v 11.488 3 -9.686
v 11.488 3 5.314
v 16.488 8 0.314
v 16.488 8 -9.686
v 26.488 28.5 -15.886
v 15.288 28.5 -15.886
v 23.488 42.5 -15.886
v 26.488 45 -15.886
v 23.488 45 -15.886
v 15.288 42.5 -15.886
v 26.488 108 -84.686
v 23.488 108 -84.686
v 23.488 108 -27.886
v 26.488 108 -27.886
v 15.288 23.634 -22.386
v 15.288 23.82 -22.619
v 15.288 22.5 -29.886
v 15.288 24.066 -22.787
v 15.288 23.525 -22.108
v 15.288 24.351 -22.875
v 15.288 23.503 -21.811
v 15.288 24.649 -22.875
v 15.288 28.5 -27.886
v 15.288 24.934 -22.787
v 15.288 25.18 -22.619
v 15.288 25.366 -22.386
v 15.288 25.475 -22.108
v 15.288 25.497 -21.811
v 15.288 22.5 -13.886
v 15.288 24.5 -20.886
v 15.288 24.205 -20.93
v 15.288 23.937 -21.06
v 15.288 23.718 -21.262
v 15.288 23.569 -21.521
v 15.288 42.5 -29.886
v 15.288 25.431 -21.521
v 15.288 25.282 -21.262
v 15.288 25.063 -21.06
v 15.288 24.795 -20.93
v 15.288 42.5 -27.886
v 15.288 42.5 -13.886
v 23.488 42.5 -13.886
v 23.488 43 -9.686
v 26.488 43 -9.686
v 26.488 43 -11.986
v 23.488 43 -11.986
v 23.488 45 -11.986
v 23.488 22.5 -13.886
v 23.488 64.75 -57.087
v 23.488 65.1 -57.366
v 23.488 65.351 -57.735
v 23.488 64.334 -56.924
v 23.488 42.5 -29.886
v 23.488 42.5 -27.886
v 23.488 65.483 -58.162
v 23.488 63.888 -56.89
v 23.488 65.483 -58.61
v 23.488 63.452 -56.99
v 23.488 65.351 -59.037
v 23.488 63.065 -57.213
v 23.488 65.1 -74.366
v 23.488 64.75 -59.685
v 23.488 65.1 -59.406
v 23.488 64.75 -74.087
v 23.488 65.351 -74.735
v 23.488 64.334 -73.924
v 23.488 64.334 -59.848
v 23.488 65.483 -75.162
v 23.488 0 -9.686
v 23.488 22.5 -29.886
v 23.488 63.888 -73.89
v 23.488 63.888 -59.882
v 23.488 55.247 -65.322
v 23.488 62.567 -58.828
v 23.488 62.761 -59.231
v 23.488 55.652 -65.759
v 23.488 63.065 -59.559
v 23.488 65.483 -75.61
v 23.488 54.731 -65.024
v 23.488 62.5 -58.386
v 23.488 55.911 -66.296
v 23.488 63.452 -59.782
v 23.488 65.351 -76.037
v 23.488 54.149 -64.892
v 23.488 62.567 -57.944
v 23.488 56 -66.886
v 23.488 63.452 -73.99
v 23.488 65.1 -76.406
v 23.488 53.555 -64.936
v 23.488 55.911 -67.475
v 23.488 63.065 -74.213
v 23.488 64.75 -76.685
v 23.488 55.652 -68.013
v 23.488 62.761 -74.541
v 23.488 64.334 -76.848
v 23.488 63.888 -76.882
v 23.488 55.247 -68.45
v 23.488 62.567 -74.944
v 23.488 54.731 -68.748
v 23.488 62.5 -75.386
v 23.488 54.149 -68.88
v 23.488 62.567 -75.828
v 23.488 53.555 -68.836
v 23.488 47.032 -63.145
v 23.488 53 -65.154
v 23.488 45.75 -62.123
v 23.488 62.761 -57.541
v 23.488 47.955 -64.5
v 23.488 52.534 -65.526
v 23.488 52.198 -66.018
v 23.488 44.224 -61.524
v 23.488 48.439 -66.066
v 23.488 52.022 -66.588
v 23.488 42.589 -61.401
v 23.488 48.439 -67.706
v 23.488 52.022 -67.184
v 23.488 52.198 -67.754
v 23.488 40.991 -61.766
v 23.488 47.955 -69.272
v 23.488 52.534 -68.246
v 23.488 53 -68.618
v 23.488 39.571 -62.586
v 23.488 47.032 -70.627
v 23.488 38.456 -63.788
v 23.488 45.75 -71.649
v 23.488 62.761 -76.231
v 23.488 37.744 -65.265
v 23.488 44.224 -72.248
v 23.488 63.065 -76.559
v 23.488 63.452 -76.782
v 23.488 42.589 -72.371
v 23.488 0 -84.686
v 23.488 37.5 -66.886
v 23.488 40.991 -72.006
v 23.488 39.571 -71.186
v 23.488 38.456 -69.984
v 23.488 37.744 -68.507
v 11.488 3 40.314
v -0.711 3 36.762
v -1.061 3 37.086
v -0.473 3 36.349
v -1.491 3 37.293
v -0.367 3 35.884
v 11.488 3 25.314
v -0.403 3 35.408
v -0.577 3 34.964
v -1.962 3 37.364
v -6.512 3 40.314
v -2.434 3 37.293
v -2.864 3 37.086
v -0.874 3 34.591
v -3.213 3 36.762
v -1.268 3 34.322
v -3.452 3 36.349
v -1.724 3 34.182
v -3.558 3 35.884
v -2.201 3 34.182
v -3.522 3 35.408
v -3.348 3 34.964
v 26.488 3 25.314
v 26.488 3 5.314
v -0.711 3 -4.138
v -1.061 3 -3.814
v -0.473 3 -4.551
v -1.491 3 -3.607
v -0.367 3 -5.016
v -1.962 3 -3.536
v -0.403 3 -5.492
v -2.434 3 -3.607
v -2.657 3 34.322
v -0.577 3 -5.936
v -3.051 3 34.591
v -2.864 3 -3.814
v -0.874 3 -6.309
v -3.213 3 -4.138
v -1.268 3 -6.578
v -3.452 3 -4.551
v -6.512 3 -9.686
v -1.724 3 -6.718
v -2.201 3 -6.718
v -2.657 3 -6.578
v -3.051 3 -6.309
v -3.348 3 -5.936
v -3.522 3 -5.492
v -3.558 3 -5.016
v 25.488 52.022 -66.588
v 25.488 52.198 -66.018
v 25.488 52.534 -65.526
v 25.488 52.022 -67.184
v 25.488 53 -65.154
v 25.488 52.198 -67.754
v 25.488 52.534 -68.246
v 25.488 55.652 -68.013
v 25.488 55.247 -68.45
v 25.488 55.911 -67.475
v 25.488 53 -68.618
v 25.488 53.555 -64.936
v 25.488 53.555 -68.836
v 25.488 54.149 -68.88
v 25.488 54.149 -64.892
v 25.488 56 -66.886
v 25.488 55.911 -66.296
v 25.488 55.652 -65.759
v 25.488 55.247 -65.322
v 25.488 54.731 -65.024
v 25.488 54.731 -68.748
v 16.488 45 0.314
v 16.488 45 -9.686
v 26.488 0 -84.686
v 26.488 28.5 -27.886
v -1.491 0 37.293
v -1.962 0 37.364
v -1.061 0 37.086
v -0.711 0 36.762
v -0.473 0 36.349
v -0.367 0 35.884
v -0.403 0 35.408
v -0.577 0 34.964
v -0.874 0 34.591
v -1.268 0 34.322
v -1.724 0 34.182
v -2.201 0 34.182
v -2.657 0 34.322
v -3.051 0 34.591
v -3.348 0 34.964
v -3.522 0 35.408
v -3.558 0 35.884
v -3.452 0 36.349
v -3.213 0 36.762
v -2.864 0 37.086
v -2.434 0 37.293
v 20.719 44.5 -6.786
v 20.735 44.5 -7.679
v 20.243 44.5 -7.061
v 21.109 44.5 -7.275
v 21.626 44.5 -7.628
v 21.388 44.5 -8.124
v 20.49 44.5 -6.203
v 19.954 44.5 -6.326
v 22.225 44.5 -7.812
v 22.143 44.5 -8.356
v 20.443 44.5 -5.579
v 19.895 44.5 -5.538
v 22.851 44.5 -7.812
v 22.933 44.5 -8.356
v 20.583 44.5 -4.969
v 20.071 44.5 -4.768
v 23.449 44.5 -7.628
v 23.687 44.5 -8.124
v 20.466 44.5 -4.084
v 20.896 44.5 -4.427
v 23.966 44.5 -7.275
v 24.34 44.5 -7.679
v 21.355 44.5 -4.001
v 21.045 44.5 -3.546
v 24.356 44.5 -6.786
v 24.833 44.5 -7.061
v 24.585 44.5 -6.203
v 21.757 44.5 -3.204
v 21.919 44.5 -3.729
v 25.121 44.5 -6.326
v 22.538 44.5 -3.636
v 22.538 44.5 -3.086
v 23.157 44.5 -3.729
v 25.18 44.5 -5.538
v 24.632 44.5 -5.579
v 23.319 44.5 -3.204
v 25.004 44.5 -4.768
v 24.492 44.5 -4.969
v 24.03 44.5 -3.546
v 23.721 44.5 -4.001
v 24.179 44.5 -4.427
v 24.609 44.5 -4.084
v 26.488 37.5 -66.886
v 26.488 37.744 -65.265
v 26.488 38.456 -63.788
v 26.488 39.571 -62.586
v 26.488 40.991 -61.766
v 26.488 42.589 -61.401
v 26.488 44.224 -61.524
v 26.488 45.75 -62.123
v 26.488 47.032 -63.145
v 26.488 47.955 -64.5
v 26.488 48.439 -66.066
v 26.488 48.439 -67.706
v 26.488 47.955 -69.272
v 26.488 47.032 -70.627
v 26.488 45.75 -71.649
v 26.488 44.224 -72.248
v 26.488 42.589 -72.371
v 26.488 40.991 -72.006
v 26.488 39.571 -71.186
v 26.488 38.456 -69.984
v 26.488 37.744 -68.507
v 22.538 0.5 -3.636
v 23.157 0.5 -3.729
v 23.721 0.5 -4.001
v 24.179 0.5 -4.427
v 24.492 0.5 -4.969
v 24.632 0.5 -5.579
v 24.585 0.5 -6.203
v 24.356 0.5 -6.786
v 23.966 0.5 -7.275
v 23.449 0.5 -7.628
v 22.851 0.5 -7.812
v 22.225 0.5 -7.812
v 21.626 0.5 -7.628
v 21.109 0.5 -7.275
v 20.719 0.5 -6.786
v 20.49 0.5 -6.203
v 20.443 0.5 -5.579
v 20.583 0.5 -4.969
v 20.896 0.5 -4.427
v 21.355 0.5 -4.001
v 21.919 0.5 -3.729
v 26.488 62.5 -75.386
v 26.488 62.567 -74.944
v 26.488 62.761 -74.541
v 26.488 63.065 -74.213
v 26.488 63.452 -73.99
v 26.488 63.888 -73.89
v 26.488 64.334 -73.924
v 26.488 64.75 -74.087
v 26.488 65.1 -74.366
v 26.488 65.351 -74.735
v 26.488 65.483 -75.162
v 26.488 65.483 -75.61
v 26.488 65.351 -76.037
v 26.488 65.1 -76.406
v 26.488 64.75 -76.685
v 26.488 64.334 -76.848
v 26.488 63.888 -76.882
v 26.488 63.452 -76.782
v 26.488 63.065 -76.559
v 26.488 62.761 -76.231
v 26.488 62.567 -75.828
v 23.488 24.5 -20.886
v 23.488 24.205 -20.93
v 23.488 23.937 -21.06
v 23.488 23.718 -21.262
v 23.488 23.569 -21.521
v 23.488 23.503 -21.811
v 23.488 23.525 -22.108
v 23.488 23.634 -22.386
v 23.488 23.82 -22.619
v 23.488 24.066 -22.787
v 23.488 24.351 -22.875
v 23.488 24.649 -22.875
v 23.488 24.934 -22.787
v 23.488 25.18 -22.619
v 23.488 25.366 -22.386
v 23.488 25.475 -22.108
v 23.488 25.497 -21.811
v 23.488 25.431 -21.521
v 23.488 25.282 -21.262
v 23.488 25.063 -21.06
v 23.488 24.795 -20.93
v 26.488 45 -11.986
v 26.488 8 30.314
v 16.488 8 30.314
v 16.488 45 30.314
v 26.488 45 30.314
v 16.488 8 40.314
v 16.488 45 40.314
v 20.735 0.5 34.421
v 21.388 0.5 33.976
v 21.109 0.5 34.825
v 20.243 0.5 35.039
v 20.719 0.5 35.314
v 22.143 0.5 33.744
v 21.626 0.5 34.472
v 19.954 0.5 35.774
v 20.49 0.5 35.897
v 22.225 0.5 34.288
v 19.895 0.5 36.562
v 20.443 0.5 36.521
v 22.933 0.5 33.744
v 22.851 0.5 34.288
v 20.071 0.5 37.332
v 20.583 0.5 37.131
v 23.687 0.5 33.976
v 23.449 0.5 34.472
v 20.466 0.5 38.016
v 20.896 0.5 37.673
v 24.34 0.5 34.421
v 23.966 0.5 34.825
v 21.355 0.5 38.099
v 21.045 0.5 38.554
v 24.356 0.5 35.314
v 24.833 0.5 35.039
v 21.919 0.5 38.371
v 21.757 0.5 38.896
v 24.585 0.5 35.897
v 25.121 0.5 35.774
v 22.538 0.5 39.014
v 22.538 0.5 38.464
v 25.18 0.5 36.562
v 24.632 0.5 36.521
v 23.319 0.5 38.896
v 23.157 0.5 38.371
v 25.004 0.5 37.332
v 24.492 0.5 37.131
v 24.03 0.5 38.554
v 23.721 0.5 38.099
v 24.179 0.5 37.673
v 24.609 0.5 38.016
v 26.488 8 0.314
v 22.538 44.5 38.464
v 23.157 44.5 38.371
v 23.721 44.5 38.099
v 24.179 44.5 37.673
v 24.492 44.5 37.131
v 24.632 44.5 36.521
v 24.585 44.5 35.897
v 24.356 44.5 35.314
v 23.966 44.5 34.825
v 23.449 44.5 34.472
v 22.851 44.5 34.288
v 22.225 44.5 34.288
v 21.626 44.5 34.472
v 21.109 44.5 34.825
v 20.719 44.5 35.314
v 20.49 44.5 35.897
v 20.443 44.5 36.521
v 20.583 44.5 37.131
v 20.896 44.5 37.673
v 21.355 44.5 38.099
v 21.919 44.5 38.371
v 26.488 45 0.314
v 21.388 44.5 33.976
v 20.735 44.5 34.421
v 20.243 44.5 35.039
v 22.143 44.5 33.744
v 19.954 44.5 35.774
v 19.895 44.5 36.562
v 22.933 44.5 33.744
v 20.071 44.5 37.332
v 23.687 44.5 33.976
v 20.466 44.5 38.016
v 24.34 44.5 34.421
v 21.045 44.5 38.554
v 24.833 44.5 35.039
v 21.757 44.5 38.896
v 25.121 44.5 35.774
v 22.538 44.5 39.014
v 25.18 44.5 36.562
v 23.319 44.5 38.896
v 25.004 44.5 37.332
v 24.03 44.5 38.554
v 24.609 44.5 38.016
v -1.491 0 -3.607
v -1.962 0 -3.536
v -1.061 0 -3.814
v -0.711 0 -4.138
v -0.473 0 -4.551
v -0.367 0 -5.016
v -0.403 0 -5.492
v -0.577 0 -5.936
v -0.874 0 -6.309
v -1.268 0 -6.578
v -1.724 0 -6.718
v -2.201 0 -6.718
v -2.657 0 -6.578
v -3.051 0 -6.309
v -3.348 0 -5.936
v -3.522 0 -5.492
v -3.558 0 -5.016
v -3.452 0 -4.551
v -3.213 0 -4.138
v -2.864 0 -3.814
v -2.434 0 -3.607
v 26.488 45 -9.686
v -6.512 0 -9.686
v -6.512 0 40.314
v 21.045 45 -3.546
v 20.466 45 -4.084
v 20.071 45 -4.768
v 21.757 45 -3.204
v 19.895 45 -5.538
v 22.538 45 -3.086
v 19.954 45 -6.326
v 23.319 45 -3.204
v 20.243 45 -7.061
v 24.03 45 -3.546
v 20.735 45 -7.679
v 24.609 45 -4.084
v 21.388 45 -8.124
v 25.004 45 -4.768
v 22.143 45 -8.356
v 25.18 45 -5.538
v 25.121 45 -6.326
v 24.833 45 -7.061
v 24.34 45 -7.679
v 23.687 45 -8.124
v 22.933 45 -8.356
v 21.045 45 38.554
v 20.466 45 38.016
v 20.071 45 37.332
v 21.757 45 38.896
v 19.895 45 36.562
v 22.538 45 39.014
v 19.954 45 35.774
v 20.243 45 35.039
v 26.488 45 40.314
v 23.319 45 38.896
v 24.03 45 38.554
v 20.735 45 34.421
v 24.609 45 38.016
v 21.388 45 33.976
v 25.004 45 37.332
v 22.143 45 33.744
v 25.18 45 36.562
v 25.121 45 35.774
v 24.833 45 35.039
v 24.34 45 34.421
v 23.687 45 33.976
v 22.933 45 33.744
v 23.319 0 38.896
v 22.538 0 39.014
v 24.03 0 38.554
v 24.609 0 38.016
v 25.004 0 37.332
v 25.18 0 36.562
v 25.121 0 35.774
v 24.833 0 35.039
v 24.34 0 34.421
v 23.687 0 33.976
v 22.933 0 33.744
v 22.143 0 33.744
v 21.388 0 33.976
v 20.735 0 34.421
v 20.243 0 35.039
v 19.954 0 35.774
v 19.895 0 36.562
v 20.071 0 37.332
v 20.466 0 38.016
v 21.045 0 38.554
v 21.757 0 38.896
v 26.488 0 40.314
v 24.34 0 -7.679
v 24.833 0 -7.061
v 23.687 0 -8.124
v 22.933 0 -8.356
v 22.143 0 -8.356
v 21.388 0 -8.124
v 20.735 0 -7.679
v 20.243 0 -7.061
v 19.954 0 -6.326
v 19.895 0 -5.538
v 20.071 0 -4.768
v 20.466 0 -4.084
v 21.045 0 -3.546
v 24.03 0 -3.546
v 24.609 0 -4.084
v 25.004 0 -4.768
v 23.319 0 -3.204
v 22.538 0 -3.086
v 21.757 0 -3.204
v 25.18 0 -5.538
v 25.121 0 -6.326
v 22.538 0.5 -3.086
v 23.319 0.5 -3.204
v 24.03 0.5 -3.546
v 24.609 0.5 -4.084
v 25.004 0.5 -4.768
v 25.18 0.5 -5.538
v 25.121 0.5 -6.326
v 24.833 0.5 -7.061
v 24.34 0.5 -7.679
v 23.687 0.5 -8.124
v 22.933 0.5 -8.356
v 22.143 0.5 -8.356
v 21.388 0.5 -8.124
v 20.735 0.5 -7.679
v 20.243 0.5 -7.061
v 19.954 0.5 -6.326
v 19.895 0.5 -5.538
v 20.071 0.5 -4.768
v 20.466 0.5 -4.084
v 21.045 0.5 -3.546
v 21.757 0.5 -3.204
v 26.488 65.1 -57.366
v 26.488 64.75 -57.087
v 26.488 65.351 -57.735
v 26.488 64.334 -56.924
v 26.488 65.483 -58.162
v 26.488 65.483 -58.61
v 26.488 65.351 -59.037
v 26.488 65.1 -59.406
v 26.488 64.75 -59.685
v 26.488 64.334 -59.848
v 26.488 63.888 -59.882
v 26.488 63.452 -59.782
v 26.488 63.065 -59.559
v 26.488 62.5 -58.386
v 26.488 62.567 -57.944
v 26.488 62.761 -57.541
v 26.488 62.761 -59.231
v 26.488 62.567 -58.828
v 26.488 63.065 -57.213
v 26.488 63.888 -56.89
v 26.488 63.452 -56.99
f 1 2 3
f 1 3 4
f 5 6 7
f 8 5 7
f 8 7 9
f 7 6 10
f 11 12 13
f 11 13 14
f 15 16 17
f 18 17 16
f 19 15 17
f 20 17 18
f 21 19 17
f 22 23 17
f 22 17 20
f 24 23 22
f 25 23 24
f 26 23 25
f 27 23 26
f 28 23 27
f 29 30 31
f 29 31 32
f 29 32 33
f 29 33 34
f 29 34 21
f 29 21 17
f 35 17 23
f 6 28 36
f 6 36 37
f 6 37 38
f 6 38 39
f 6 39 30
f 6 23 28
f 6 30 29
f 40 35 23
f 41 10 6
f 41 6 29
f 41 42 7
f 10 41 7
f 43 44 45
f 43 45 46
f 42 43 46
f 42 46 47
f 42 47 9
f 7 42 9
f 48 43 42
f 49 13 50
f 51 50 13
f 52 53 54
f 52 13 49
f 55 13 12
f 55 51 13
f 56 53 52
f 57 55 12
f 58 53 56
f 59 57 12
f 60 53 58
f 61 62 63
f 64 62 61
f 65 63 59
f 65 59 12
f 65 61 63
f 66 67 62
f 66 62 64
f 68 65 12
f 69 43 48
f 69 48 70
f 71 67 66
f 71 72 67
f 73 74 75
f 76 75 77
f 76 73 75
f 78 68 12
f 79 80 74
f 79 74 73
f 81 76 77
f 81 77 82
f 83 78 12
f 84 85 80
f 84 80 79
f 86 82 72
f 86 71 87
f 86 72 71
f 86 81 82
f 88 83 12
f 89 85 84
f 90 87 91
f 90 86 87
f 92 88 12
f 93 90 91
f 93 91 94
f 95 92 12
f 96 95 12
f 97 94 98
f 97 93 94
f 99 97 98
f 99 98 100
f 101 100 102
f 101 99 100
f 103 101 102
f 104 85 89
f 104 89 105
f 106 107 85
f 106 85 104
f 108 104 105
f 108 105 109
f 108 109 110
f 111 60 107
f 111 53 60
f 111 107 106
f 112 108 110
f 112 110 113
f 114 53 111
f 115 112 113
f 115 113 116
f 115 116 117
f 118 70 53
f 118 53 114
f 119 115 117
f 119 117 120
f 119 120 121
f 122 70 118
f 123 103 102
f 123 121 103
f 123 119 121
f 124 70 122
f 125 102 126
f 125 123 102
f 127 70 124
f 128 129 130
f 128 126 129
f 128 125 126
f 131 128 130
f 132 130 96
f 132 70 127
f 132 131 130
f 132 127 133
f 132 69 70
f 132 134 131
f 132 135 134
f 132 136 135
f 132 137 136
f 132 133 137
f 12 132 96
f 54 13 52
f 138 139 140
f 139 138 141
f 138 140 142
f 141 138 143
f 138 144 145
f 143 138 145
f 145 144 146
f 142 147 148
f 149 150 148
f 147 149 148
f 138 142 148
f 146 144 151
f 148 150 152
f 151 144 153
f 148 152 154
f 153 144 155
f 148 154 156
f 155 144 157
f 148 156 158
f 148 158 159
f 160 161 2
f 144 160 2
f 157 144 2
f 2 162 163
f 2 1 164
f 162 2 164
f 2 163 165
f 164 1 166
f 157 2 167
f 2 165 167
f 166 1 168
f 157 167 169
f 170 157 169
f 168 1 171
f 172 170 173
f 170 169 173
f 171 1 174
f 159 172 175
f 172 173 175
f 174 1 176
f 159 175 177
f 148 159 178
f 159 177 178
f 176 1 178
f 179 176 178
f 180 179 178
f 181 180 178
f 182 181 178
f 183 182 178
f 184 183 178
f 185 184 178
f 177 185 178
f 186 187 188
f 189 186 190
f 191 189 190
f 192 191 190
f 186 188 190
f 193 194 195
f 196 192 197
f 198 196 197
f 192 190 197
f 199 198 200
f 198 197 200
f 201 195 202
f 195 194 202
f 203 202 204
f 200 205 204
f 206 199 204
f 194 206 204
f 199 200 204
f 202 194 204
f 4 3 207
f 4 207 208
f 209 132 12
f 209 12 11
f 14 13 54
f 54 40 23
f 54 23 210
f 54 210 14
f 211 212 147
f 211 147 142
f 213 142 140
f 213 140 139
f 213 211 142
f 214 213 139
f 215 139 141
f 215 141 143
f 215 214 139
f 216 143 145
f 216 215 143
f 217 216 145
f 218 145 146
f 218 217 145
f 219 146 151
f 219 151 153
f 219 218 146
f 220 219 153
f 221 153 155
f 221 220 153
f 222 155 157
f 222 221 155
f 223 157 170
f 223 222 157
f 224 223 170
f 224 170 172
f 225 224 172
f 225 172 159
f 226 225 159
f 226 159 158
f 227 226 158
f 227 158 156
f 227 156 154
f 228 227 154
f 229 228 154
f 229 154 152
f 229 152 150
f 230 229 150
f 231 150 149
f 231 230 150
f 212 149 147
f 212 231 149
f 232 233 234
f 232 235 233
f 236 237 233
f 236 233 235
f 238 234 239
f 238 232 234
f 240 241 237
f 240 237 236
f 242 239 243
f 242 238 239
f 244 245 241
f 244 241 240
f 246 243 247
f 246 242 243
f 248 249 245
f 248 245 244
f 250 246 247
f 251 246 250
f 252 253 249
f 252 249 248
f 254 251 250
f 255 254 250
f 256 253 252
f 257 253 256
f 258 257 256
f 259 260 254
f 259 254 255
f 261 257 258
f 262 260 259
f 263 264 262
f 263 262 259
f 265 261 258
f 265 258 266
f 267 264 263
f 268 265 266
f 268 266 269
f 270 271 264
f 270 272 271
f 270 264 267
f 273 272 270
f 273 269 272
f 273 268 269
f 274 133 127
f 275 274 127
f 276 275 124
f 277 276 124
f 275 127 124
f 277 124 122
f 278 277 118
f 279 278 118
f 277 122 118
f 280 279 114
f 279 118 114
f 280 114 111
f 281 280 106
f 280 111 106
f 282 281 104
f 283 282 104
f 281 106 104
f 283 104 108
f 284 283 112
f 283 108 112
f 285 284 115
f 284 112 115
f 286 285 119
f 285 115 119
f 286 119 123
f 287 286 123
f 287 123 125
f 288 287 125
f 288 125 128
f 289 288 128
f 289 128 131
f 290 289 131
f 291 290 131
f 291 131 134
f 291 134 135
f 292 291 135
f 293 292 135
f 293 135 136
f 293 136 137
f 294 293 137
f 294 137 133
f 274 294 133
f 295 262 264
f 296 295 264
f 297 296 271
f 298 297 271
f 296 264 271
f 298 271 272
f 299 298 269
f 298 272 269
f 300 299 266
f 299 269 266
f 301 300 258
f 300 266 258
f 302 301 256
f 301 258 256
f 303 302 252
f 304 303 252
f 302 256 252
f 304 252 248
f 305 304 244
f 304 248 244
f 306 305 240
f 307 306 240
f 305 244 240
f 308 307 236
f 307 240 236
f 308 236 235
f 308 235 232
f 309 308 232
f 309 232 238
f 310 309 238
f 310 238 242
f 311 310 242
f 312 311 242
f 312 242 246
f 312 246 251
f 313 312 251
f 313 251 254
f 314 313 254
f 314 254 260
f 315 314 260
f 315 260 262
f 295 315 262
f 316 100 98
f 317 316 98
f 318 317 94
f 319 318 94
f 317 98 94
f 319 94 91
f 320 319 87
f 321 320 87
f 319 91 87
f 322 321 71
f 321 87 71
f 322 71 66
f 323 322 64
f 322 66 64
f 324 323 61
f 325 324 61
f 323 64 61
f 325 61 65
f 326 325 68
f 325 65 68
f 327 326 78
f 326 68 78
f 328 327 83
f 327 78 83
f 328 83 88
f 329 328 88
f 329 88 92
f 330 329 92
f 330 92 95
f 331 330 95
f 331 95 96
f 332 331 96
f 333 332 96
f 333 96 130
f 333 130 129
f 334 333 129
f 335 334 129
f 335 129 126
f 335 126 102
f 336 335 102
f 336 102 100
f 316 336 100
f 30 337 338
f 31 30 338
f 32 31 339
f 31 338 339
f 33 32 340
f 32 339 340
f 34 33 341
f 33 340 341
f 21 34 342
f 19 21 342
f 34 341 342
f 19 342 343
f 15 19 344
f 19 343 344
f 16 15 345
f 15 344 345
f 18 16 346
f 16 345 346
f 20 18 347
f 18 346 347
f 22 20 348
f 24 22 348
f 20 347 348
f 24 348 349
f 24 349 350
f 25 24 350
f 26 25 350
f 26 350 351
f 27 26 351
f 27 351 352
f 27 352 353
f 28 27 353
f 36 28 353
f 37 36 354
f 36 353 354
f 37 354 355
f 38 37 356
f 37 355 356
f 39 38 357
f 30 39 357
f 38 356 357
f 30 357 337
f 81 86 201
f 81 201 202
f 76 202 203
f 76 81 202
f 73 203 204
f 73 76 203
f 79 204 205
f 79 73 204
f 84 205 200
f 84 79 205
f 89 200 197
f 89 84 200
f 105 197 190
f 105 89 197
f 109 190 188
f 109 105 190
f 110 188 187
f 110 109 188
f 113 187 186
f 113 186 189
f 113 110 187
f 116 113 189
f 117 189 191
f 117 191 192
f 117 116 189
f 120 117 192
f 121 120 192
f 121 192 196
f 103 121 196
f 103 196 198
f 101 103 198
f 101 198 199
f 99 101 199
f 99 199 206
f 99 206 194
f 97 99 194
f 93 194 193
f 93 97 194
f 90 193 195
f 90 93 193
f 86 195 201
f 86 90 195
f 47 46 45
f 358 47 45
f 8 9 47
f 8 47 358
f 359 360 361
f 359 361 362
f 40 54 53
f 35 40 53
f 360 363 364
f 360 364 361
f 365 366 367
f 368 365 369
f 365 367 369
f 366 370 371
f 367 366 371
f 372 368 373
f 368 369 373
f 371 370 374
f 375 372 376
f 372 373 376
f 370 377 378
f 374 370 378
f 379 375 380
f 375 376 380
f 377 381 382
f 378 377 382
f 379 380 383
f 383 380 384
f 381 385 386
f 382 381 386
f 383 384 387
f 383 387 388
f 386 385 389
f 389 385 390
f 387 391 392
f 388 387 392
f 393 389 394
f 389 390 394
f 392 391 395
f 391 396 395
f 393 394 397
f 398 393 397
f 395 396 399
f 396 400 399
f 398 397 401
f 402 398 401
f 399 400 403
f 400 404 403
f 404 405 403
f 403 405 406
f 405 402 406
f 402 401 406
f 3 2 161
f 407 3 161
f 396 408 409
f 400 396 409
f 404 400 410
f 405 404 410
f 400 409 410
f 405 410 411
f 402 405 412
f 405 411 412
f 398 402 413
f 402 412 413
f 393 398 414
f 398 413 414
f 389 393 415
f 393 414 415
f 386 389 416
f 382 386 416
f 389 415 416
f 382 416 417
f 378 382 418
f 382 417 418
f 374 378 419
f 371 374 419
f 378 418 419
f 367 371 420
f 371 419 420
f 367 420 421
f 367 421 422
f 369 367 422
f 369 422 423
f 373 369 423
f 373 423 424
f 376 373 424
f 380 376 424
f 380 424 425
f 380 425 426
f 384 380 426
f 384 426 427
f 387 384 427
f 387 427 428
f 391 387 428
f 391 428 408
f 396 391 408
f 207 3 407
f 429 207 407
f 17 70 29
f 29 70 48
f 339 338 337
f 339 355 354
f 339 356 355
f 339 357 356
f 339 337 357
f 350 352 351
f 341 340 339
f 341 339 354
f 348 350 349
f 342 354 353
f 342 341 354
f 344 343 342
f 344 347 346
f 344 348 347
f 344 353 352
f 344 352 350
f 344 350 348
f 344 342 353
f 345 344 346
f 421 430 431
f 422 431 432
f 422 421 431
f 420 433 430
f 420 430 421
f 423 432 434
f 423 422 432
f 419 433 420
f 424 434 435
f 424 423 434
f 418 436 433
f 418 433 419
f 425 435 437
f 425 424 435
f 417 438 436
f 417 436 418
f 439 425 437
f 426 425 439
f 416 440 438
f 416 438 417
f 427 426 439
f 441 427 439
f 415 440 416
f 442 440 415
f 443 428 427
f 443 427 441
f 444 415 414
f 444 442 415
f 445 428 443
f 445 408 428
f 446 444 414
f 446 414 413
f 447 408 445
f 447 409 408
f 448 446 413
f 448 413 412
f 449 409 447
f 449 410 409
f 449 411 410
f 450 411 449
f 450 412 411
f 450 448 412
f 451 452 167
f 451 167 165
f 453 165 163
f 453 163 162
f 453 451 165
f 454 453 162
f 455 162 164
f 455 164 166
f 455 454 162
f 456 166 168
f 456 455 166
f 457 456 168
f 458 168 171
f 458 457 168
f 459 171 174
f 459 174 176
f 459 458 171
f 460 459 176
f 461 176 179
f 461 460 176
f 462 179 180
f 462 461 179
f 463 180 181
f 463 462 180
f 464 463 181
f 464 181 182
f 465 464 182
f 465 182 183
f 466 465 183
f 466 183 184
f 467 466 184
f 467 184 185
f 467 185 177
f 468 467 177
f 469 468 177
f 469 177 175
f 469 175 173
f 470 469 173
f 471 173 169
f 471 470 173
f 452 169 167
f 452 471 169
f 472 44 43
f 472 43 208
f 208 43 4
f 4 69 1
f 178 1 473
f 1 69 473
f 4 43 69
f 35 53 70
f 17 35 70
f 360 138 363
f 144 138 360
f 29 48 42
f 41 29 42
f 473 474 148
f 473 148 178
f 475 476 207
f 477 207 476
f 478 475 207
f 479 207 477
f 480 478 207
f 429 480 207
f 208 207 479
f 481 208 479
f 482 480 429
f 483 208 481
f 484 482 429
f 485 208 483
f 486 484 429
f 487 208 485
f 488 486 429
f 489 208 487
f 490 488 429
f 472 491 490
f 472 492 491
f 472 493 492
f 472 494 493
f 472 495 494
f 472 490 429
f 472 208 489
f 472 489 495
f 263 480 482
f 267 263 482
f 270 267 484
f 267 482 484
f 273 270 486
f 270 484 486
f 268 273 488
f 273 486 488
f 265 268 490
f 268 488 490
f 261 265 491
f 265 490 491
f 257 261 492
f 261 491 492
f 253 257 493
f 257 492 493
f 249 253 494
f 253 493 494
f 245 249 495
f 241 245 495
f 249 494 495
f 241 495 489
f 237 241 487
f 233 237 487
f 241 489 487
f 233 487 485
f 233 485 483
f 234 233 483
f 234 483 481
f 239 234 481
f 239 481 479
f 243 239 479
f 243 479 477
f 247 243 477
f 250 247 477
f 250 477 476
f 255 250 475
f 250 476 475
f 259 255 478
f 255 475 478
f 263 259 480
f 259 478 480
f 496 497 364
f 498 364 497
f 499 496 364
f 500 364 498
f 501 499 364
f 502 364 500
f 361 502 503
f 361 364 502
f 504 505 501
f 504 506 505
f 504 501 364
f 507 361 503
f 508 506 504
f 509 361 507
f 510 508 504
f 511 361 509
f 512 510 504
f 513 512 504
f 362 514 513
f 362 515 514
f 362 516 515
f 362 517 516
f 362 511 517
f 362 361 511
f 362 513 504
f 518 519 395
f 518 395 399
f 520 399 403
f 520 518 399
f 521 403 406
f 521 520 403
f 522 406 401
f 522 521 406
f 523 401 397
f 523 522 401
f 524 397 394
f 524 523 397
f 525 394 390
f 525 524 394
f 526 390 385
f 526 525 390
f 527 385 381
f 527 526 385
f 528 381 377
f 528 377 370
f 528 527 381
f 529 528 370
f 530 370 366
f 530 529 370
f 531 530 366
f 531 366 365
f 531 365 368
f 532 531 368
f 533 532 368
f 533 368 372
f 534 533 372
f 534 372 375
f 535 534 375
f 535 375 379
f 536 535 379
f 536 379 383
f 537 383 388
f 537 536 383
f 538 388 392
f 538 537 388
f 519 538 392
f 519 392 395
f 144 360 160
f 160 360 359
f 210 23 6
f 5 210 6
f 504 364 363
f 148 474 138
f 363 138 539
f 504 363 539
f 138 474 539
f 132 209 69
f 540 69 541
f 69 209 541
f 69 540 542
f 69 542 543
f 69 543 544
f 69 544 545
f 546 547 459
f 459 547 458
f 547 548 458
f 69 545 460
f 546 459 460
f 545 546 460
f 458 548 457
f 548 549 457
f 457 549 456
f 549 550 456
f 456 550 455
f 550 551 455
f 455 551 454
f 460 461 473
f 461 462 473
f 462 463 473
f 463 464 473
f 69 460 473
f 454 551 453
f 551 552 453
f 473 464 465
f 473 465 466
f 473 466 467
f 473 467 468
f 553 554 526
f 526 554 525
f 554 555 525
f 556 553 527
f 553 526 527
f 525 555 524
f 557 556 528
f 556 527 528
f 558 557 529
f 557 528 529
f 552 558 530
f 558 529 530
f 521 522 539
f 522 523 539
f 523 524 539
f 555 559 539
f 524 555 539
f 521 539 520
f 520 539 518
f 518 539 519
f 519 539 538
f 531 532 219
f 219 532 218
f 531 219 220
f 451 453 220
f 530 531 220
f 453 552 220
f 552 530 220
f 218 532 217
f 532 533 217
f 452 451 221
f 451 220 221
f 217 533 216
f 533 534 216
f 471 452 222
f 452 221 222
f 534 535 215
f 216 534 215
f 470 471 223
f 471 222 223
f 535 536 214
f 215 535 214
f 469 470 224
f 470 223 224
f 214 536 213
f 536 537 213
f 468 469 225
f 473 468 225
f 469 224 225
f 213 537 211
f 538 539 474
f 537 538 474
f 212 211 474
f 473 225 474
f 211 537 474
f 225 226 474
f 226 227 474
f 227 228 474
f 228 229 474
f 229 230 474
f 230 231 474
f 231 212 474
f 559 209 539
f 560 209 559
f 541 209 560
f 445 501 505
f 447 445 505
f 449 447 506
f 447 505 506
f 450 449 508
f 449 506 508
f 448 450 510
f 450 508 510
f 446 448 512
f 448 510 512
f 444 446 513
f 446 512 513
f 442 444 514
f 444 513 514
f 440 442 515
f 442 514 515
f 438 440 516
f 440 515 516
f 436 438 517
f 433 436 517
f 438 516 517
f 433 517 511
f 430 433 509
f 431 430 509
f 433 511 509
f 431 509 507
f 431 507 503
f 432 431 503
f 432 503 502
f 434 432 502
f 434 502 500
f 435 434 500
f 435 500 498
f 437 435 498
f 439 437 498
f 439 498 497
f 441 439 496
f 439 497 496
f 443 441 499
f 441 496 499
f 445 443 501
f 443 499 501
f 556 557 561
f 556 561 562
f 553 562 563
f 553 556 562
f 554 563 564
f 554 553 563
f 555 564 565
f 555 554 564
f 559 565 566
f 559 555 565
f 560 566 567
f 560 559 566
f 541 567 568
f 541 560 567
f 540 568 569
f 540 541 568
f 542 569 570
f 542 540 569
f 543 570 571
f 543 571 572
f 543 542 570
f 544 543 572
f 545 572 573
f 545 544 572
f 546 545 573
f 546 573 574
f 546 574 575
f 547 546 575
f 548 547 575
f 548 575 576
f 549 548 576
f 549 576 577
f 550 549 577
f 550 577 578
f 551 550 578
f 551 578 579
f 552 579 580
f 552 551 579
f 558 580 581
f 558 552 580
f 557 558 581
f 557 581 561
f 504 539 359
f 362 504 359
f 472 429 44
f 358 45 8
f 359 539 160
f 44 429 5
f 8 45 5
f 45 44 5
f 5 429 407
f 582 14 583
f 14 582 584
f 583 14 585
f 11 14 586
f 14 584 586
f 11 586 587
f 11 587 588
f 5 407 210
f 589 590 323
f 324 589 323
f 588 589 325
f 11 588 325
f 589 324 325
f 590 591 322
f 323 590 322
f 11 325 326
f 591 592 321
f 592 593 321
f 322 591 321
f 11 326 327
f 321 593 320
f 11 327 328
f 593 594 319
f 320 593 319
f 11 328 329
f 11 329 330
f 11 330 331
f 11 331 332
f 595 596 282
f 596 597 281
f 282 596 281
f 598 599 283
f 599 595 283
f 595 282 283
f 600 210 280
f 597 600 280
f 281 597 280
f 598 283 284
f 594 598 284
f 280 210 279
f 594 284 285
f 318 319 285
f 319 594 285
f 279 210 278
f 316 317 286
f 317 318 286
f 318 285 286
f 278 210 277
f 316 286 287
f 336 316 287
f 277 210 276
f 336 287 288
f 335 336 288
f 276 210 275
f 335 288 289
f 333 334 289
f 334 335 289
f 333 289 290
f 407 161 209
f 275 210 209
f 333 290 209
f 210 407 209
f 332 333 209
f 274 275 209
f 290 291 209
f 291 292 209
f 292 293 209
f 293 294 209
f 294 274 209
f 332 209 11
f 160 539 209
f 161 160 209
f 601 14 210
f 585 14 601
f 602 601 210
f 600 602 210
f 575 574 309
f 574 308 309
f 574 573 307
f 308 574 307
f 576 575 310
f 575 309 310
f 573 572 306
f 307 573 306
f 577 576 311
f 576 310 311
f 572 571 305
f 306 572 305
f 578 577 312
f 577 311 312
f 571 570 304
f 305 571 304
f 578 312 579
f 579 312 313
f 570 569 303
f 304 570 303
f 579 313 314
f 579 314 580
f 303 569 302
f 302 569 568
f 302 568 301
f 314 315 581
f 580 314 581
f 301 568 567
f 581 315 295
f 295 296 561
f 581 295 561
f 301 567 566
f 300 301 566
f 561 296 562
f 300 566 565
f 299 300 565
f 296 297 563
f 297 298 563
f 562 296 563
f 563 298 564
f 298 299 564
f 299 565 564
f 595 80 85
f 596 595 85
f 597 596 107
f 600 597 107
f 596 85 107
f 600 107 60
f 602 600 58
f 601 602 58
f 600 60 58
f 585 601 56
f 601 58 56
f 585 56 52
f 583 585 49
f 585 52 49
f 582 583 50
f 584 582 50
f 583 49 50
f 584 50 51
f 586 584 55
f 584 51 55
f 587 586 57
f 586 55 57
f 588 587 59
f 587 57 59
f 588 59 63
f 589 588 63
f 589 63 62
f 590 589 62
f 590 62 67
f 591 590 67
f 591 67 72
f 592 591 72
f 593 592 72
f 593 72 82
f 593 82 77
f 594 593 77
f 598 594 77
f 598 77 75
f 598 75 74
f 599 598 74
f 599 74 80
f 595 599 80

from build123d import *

# Parameters (mm, degrees)
SKETCH1_R           = 1.6
BOSS_EXTRUDE1_DEPTH = 3
SKETCH2_W           = 10
SKETCH2_H           = 10
BOSS_EXTRUDE2_DEPTH = 42
CHAMFER1_SIZE       = 5
SKETCH3_R           = 2.1
CUT_EXTRUDE1_DEPTH  = 52
SKETCH4_R           = 2.65
CUT_EXTRUDE2_DEPTH  = 0.5
SKETCH5_W           = 3
SKETCH5_H           = 43
BOSS_EXTRUDE3_DEPTH = 75
SKETCH6_W           = 3
SKETCH6_H           = 72.7
BOSS_EXTRUDE4_DEPTH = 2
SKETCH7_W           = 3
SKETCH7_H           = 68.8
BOSS_EXTRUDE5_DEPTH = 3
BOSS_EXTRUDE7_DEPTH = 8.2
SKETCH9_W           = 12
SKETCH9_H           = 19.5
CUT_EXTRUDE3_DEPTH  = 8.5
SKETCH10_W          = 3
SKETCH10_H          = 56.8
BOSS_EXTRUDE8_DEPTH = 15
SKETCH13_W          = 3
SKETCH13_H          = 56.8
BOSS_EXTRUDE9_DEPTH = 45
SKETCH14_R          = 1.5
SKETCH14_R_2        = 5.5
CUT_EXTRUDE4_DEPTH  = 10
CAVITY2_START       = 23.487603306
CAVITY2_OUTLINE_R   = 2
CAVITY2_DEPTH       = 2


# Read off the part's stored shape, not the designer's step: Cavity2
with BuildPart() as part:
    # Sketch1 → Boss-Extrude1 (new body)
    with BuildSketch(Plane(origin=(0, 0, 0), x_dir=(1, 0, 0), z_dir=(0, 1, 0))):
        Polygon((-6.512396694, 9.685950413), (1.487603306, 9.685950413), (26.487603306, 9.685950413), (26.487603306, -40.314049587), (1.487603306, -40.314049587), (-6.512396694, -40.314049587), align=None)
        with Locations(Location((-1.962396694, -35.764049587, 0), (0, 0, 270))):
            Circle(SKETCH1_R, mode=Mode.SUBTRACT)
        with Locations(Location((-1.962396694, 5.135950413, 0), (0, 0, 270))):
            Circle(SKETCH1_R, mode=Mode.SUBTRACT)
    extrude(amount=BOSS_EXTRUDE1_DEPTH)

    # Sketch2 → Boss-Extrude2 (add)
    with BuildSketch(Plane(origin=(0, 3, 0), x_dir=(1, 0, 0), z_dir=(0, 1, 0))):
        with Locations((21.487603306, -35.314049587)):
            Rectangle(SKETCH2_W, SKETCH2_H)
        with Locations((21.487603306, 4.685950413)):
            Rectangle(SKETCH2_W, SKETCH2_H)
    extrude(amount=BOSS_EXTRUDE2_DEPTH)

    # Chamfer1
    chamfer1_edges = [part.edges().sort_by_distance(p)[0] for p in [
        (21.487603306, 3, 30.314049587),
        (16.487603306, 3, 35.314049587),
        (16.487603306, 3, -4.685950413),
        (21.487603306, 3, 0.314049587),
    ]]
    chamfer(chamfer1_edges, length=CHAMFER1_SIZE)

    # Sketch3 → Cut-Extrude1 (cut)
    with BuildSketch(Plane(origin=(0, 45, 0), x_dir=(1, 0, 0), z_dir=(0, 1, 0))):
        with Locations(Location((22.537603306, -36.364049587, 0), (0, 0, 270))):
            Circle(SKETCH3_R)
        with Locations(Location((22.537603306, 5.735950413, 0), (0, 0, 270))):
            Circle(SKETCH3_R)
    extrude(amount=-CUT_EXTRUDE1_DEPTH, mode=Mode.SUBTRACT)

    # Sketch4 → Cut-Extrude2 (cut)
    with BuildSketch(Plane(origin=(0, 45, 0), x_dir=(1, 0, 0), z_dir=(0, 1, 0))):
        with Locations(Location((22.537603306, -36.364049587, 0), (0, 0, 270))):
            Circle(SKETCH4_R)
        with Locations(Location((22.537603306, 5.735950413, 0), (0, 0, 270))):
            Circle(SKETCH4_R)
    cut_extrude2 = extrude(amount=-CUT_EXTRUDE2_DEPTH, mode=Mode.SUBTRACT)

    # Mirror1: Cut-Extrude2 across plane
    add(cut_extrude2.mirror(Plane(origin=(0, 22.5, 0), x_dir=(0, 0, 1), z_dir=(0, -1, 0))), mode=Mode.SUBTRACT)

    # Sketch5 → Boss-Extrude3 (add)
    with BuildSketch(Plane(origin=(0, 0, -9.685950413), x_dir=(-1, 0, 0), z_dir=(0, 0, -1))):
        with Locations((-24.987603306, 21.5)):
            Rectangle(SKETCH5_W, SKETCH5_H)
    extrude(amount=BOSS_EXTRUDE3_DEPTH)

    # Sketch6 → Boss-Extrude4 (add)
    with BuildSketch(Plane(origin=(0, 43, 0), x_dir=(1, 0, 0), z_dir=(0, 1, 0))):
        with Locations((24.987603306, 48.335950413)):
            Rectangle(SKETCH6_W, SKETCH6_H)
    extrude(amount=BOSS_EXTRUDE4_DEPTH)

    # Sketch7 → Boss-Extrude5 (add)
    with BuildSketch(Plane(origin=(0, 45, 0), x_dir=(1, 0, 0), z_dir=(0, 1, 0))):
        with Locations((24.987603306, 50.285950413)):
            Rectangle(SKETCH7_W, SKETCH7_H)
    extrude(amount=BOSS_EXTRUDE5_DEPTH)

    # Sketch8 → Boss-Extrude7 (add)
    with BuildSketch(Plane.ZY.offset(-23.487603306)):
        Polygon((-27.885950413, 24.5), (-27.885950413, 28.5), (-27.885950413, 42.5), (-29.885950413, 42.5), (-29.885950413, 22.5), (-27.885950413, 22.5), align=None)
        with BuildLine():
            Line((-15.885950413, 24.5), (-15.885950413, 28.5))
            Line((-15.885950413, 28.5), (-27.885950413, 28.5))
            Line((-27.885950413, 28.5), (-27.885950413, 24.5))
            Line((-27.885950413, 24.5), (-22.885950413, 24.5))
            ThreePointArc((-22.885950413, 24.5), (-21.885950413, 25.5), (-20.885950413, 24.5))
            Line((-20.885950413, 24.5), (-15.885950413, 24.5))
        make_face()
        with BuildLine():
            Line((-15.885950413, 22.5), (-15.885950413, 24.5))
            Line((-15.885950413, 24.5), (-20.885950413, 24.5))
            ThreePointArc((-20.885950413, 24.5), (-21.885950413, 23.5), (-22.885950413, 24.5))
            Line((-22.885950413, 24.5), (-27.885950413, 24.5))
            Line((-27.885950413, 24.5), (-27.885950413, 22.5))
            Line((-27.885950413, 22.5), (-15.885950413, 22.5))
        make_face()
        Polygon((-15.885950413, 42.5), (-15.885950413, 28.5), (-15.885950413, 24.5), (-15.885950413, 22.5), (-13.885950413, 22.5), (-13.885950413, 42.5), align=None)
    extrude(amount=BOSS_EXTRUDE7_DEPTH)

    # Sketch9 → Cut-Extrude3 (cut)
    with BuildSketch(Plane.ZY.offset(-23.487603306)):
        with Locations((-21.885950413, 38.25)):
            Rectangle(SKETCH9_W, SKETCH9_H)
    extrude(amount=-CUT_EXTRUDE3_DEPTH, mode=Mode.SUBTRACT)

    # Sketch10 → Boss-Extrude8 (add)
    with BuildSketch(Plane(origin=(0, 48, 0), x_dir=(1, 0, 0), z_dir=(0, 1, 0))):
        with Locations((24.987603306, 56.285950413)):
            Rectangle(SKETCH10_W, SKETCH10_H)
    extrude(amount=BOSS_EXTRUDE8_DEPTH)

    # Sketch13 → Boss-Extrude9 (add)
    with BuildSketch(Plane(origin=(0, 63, 0), x_dir=(1, 0, 0), z_dir=(0, 1, 0))):
        with Locations((24.987603306, 56.285950413)):
            Rectangle(SKETCH13_W, SKETCH13_H)
    extrude(amount=BOSS_EXTRUDE9_DEPTH)

    # Sketch14 → Cut-Extrude4 (cut)
    with BuildSketch(Plane.ZY.offset(-23.487603306)):
        with Locations(Location((-58.385950413, 64, 0), (0, 0, 270))):
            Circle(SKETCH14_R)
        with Locations(Location((-75.385950413, 64, 0), (0, 0, 270))):
            Circle(SKETCH14_R)
        with Locations(Location((-66.885950413, 43, 0), (0, 0, 270))):
            Circle(SKETCH14_R_2)
    extrude(amount=-CUT_EXTRUDE4_DEPTH, mode=Mode.SUBTRACT)

    # Cavity2 outline → Cavity2 (cut)
    with BuildSketch(Plane.YZ.offset(CAVITY2_START)):
        with Locations((54, -66.885950413)):
            Circle(CAVITY2_OUTLINE_R)
    extrude(amount=CAVITY2_DEPTH, mode=Mode.SUBTRACT)


solid = part.part
